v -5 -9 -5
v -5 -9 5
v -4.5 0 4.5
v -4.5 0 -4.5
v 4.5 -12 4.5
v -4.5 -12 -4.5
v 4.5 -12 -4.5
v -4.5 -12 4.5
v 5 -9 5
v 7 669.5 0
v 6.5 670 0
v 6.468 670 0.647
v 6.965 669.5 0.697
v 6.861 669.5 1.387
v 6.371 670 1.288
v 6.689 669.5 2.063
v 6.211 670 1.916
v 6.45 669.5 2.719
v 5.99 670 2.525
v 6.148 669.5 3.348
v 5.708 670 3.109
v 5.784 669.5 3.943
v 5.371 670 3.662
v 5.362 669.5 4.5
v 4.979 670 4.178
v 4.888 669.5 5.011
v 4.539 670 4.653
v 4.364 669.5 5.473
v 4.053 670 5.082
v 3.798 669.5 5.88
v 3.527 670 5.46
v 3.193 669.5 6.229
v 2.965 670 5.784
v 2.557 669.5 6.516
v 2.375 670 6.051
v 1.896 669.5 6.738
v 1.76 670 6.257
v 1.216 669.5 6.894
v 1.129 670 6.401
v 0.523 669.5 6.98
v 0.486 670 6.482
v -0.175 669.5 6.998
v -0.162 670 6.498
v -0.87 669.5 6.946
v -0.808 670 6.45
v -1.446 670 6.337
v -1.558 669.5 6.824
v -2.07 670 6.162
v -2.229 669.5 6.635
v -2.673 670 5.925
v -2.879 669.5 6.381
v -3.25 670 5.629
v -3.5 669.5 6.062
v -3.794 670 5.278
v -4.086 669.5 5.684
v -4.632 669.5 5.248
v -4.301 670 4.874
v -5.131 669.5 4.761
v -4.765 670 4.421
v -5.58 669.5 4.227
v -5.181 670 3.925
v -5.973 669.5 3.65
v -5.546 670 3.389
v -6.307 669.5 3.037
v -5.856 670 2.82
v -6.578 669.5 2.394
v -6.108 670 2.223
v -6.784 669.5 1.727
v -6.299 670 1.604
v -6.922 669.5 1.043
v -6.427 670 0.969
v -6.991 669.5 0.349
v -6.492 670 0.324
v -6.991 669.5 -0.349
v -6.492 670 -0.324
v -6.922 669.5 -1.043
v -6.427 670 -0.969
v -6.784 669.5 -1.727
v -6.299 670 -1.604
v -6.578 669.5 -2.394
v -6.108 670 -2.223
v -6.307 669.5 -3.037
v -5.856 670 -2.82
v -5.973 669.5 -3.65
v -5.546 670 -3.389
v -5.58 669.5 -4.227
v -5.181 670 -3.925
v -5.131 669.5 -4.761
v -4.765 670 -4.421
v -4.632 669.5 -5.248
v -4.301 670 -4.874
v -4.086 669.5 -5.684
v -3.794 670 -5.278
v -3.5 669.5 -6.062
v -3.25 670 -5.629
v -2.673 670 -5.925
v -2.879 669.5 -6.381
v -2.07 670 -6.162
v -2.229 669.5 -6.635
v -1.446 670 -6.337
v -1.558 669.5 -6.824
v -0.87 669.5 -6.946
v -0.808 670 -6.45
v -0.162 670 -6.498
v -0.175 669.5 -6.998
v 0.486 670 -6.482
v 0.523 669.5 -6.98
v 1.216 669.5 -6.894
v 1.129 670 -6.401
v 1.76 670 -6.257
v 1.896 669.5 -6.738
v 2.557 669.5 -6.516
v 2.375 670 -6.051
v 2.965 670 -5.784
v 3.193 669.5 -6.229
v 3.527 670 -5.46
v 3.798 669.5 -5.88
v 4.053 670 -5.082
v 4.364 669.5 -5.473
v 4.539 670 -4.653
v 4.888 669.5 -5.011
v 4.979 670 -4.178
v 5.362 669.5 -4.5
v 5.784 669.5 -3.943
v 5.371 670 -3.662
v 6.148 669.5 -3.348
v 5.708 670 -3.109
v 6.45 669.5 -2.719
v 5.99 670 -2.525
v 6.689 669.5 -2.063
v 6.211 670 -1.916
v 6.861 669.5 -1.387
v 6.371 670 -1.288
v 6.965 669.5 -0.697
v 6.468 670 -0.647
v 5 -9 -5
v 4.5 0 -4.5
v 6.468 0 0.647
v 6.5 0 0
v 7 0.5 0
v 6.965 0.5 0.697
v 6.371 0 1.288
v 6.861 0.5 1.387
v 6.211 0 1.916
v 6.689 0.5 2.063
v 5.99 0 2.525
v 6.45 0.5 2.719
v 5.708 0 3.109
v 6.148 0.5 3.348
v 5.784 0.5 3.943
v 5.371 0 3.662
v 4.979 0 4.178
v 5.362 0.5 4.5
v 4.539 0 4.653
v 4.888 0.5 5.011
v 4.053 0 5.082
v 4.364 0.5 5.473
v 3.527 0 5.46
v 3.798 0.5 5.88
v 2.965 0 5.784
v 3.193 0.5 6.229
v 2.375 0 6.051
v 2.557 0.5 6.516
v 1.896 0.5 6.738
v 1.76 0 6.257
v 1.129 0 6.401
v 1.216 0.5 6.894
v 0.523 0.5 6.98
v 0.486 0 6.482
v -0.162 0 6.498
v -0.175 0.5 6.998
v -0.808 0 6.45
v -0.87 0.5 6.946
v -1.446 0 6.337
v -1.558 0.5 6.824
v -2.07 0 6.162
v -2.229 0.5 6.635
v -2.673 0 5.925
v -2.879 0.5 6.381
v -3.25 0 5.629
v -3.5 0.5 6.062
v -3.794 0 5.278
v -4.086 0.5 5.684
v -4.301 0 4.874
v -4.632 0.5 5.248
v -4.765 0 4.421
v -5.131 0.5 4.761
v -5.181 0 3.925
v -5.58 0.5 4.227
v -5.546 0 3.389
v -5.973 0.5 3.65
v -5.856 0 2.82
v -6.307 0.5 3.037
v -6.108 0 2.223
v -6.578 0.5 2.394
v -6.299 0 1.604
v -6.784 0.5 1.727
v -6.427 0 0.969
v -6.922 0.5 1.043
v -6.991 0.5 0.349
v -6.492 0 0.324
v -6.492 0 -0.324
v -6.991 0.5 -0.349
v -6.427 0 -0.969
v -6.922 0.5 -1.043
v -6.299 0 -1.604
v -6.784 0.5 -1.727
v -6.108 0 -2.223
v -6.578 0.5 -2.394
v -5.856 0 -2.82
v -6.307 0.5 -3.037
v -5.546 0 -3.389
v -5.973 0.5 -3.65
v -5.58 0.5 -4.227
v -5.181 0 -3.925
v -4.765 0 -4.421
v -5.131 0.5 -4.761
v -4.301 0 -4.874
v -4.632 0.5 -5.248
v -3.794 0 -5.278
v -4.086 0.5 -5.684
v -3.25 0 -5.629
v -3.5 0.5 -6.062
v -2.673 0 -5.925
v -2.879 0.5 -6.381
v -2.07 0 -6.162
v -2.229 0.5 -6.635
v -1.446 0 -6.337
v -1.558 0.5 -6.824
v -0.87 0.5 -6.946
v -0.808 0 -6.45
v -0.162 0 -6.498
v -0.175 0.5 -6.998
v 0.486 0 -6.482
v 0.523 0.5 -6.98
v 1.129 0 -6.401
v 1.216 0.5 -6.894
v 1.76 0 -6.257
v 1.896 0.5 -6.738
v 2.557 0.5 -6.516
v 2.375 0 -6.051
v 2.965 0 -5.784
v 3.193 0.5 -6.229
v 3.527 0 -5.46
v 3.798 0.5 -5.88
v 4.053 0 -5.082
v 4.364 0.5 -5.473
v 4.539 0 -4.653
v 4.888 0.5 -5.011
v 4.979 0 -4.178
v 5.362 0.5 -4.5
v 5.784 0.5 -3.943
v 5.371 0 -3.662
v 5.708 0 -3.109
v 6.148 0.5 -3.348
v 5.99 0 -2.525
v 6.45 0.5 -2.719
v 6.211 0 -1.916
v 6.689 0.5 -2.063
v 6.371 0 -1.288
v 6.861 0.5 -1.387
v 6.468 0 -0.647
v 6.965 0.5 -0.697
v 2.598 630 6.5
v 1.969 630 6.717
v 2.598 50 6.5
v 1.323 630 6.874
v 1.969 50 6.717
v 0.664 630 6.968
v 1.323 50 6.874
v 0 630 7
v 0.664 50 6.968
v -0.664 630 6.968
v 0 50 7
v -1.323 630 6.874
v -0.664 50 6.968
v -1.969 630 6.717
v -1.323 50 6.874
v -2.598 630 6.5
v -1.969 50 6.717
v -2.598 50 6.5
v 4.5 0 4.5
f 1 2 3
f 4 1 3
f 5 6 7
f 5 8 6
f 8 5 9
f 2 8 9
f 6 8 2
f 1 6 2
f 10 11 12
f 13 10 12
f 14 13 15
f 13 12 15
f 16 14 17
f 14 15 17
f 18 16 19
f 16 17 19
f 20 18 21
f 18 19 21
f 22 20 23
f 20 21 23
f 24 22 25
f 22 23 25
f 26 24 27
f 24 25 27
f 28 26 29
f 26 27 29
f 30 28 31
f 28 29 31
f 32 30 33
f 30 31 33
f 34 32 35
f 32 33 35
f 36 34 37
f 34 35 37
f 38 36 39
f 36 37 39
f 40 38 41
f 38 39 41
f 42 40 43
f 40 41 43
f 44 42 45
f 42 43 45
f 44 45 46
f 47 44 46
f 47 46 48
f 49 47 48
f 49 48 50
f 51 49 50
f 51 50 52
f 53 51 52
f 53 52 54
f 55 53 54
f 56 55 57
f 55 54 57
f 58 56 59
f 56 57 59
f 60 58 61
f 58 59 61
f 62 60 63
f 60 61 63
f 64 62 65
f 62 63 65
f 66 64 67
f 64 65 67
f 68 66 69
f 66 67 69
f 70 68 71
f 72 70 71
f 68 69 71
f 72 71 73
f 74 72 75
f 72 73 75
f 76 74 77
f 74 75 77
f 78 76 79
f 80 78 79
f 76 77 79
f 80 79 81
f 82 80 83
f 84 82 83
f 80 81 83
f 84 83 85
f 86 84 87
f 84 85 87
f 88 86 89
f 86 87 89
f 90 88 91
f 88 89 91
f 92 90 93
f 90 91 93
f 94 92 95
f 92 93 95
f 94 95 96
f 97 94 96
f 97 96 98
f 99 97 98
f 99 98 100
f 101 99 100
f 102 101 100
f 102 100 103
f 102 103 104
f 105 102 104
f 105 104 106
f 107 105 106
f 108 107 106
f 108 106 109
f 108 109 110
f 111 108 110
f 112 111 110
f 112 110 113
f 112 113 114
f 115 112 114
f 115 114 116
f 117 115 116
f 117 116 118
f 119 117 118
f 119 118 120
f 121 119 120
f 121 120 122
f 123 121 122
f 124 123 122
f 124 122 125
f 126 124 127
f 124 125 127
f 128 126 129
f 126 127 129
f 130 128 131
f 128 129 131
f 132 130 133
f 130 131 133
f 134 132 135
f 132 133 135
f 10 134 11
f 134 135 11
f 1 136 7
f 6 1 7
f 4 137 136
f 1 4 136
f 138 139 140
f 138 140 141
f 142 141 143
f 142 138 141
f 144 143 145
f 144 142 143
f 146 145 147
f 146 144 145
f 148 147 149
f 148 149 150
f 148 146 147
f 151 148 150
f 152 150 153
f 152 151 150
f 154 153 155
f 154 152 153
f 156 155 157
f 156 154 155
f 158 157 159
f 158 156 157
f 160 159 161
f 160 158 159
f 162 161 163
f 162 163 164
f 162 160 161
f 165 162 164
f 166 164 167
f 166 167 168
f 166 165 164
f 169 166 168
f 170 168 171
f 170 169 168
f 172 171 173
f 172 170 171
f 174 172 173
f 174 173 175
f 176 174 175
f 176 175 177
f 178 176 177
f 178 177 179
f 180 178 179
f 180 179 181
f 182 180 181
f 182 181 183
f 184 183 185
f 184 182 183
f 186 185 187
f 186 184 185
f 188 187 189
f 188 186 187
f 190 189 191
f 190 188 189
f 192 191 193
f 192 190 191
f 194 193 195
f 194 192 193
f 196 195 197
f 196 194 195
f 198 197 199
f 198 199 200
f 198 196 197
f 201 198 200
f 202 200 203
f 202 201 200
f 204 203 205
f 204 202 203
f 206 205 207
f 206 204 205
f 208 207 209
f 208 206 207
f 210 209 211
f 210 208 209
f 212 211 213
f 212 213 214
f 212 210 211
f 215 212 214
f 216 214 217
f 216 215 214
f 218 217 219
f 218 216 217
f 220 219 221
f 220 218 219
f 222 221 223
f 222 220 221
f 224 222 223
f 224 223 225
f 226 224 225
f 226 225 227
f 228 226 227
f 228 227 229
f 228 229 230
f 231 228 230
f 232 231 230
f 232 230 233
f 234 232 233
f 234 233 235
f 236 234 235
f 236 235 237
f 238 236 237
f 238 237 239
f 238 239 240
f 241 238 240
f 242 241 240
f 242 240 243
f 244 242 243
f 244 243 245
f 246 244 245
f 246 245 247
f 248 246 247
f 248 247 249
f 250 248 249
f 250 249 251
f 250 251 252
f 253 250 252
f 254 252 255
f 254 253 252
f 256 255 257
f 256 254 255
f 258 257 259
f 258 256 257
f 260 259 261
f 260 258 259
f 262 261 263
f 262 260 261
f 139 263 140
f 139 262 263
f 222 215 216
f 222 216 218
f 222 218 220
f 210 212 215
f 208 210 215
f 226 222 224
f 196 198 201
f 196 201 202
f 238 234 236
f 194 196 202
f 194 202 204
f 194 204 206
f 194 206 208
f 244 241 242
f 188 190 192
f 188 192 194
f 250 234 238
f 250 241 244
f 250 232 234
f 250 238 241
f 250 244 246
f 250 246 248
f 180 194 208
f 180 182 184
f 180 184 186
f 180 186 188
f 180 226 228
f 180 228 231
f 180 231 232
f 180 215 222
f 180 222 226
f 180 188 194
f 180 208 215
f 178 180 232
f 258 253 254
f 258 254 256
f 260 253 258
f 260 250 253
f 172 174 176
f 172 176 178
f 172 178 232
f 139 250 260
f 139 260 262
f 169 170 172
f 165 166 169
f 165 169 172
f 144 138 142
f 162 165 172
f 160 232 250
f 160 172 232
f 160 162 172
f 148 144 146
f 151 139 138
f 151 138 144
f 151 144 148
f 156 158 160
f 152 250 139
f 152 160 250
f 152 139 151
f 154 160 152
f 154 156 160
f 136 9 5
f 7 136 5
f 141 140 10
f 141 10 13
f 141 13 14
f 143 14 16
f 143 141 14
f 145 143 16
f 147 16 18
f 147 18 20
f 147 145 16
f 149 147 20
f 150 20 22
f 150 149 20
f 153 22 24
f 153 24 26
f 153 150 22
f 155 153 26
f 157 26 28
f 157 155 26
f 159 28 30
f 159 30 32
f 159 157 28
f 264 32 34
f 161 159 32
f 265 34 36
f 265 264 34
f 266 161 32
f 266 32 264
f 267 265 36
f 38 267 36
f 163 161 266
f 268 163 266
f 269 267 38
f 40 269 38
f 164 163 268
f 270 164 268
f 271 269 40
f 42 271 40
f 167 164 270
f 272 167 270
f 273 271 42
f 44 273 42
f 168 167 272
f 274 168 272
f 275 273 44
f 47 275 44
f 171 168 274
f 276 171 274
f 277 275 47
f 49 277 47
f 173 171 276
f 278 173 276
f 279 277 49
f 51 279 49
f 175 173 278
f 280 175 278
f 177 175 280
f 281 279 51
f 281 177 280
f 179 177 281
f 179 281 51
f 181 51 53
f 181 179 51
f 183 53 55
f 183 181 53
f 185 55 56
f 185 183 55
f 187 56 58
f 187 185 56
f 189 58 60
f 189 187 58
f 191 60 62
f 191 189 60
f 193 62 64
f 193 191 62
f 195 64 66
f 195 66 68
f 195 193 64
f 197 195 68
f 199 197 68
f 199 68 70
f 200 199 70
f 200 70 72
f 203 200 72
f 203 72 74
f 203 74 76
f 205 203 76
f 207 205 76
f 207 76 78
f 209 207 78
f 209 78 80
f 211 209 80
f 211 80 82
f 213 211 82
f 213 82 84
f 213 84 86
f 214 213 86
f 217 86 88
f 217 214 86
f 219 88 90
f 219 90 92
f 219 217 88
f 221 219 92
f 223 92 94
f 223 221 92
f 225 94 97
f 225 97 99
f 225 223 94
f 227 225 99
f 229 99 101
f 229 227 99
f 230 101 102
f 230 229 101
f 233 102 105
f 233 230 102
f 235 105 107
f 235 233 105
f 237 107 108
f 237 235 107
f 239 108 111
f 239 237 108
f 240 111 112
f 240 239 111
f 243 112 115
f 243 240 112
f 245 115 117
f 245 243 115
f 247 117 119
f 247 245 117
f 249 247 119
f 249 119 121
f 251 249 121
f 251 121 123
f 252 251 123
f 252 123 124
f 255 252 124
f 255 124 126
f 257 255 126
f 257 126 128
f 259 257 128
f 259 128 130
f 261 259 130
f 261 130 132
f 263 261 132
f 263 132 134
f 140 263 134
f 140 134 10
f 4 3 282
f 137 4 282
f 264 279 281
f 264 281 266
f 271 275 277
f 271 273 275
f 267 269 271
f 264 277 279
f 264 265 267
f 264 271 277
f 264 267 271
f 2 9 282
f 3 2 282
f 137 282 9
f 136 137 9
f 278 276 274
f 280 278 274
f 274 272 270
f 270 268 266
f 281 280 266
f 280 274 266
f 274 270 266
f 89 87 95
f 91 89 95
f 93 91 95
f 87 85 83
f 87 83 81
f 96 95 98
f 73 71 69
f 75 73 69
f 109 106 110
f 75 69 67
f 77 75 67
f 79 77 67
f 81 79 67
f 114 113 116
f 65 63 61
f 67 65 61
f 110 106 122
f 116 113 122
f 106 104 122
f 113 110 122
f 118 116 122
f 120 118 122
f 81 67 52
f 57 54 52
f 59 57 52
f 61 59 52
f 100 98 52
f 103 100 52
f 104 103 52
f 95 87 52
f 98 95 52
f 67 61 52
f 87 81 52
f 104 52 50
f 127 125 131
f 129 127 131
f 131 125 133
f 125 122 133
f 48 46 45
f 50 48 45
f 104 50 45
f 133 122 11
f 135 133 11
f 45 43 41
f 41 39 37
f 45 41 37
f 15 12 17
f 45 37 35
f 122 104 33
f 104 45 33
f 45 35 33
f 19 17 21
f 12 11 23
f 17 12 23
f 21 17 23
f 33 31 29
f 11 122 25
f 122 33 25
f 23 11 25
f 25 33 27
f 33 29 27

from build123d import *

# Parameters (mm, degrees)
F0_R      = 7
F1_DEPTH  = 670
F3_DEPTH  = 12
F5_DEPTH  = 25
F7_DEPTH  = 25
F8_DEPTH  = 25
F9_DEPTH  = 25
F12_DEPTH = 25
F13_DEPTH = 25
F14_DEPTH = 25
F15_DEPTH = 25
F16_SIZE  = 0.5
F18_W     = 68.437538
F18_H     = 580
F19_DEPTH = 0.5
F20_SIZE  = 0.5


with BuildPart() as f1:
    # F0 (on Front) → F1 (new body)
    with BuildSketch(Plane.XZ):
        Circle(F0_R)
    extrude(amount=-F1_DEPTH)

    # F16
    f16_edges = [f1.edges().sort_by_distance(p)[0] for p in [
        (-7, 0, 0),
    ]]
    chamfer(f16_edges, length=F16_SIZE)

    # F18 (on offset) → F19 (cut)
    with BuildSketch(Plane.XY.offset(7)):
        with Locations((2.298544, 340)):
            Rectangle(F18_W, F18_H)
    extrude(amount=-F19_DEPTH, mode=Mode.SUBTRACT)

    # F20
    f20_edges = [f1.edges().sort_by_distance(p)[0] for p in [
        (-7, 670, 0),
    ]]
    chamfer(f20_edges, length=F20_SIZE)


with BuildPart() as f3:
    # F2 (on Front) → F3 (new body)
    with BuildSketch(Plane.XZ):
        Polygon((5, 5), (-5, 5), (-5, 4.915034), (-5, -5), (5, -5), (5, 4.915034), align=None)
    extrude(amount=F3_DEPTH)

    # F4 (on face) → F5 (cut)
    with BuildSketch(Plane.YZ.offset(5)):
        Polygon((-9, -5), (-12, -4.5), (-12, -5), align=None)
    extrude(amount=-F5_DEPTH, mode=Mode.SUBTRACT)

    # F6 (on face) → F7 (cut)
    with BuildSketch(Plane.XY.offset(5)):
        Polygon((5, -9), (4.5, -12), (5, -12), align=None)
    extrude(amount=-F7_DEPTH, mode=Mode.SUBTRACT)

    # F6 (on face) → F8 (cut)
    with BuildSketch(Plane.XY.offset(5)):
        Polygon((-5, -12), (-4.5, -12), (-5, -9), align=None)
    extrude(amount=-F8_DEPTH, mode=Mode.SUBTRACT)

    # F4 (on face) → F9 (cut)
    with BuildSketch(Plane.YZ.offset(5)):
        Polygon((-12, 5), (-12, 4.5), (-9, 5), align=None)
    extrude(amount=-F9_DEPTH, mode=Mode.SUBTRACT)

    # F10 (on face) → F12 (cut)
    with BuildSketch(Plane.YZ.offset(5)):
        Polygon((0, 5), (-9, 5), (0, 4.5), align=None)
    extrude(amount=-F12_DEPTH, mode=Mode.SUBTRACT)

    # F11 (on face) → F13 (cut)
    with BuildSketch(Plane.XY.offset(5)):
        Polygon((4.5, 0), (5, -9), (5, 0), align=None)
    extrude(amount=-F13_DEPTH, mode=Mode.SUBTRACT)

    # F10 (on face) → F14 (cut)
    with BuildSketch(Plane.YZ.offset(5)):
        Polygon((0, -4.5), (-9, -5), (0, -5), align=None)
    extrude(amount=-F14_DEPTH, mode=Mode.SUBTRACT)

    # F11 (on face) → F15 (cut)
    with BuildSketch(Plane.XY.offset(5)):
        Polygon((-5, 0), (-5, -9), (-4.5, 0), align=None)
    extrude(amount=-F15_DEPTH, mode=Mode.SUBTRACT)


solid = Compound([f1.part, f3.part])
